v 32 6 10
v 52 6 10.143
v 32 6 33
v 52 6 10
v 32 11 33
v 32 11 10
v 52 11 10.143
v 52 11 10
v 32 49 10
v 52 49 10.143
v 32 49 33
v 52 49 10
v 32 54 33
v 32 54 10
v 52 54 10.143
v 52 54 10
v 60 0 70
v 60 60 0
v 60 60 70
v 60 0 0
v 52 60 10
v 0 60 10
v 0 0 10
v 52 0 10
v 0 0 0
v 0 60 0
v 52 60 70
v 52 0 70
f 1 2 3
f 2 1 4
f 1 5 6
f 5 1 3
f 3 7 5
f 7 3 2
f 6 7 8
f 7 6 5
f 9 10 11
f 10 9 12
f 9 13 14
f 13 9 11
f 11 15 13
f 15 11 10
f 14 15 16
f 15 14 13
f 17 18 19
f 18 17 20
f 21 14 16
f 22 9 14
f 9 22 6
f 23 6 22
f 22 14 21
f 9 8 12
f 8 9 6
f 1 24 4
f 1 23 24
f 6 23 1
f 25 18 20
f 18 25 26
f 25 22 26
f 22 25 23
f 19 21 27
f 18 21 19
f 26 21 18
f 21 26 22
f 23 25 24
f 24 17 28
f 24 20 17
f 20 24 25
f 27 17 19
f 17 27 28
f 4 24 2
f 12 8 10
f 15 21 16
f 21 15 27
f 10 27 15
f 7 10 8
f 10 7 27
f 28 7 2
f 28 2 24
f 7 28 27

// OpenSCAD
$fn = 32;

// ----------------------------------------------------------------------
// Rib bracket: 2-gusset L bracket
// ----------------------------------------------------------------------

// --- parameters (mm) ---
base_l = 60;              // foot length, X
base_w = 60;              // foot width, Y
base_t = 10;              // foot thickness
plate_t = 8;              // upright plate thickness
plate_h = 70;             // overall height
gus_l = 20;               // gusset leg along the foot
gus_h = 24;               // gusset height
gus_t = 5;                // gusset thickness
gus_edge = 6;             // gusset margin from the foot edge
n_gus = 2;                // gusset count

gus_pitch = (base_w - 2 * gus_edge - gus_t) / (n_gus - 1);  // gusset pitch

union() {
  cube([base_l, base_w, base_t]);
  translate([base_l - plate_t, 0, base_t - 1])
    cube([plate_t, base_w, plate_h - base_t + 1]);
  for (i = [0 : n_gus - 1])
    translate([base_l - plate_t - gus_l, gus_edge + i * gus_pitch, base_t - 1])
      rotate([-90, 0, 0])
        linear_extrude(height = gus_t)
          polygon(points = [[0, 0], [gus_l + 1, 0], [0, -gus_h]]);
}
